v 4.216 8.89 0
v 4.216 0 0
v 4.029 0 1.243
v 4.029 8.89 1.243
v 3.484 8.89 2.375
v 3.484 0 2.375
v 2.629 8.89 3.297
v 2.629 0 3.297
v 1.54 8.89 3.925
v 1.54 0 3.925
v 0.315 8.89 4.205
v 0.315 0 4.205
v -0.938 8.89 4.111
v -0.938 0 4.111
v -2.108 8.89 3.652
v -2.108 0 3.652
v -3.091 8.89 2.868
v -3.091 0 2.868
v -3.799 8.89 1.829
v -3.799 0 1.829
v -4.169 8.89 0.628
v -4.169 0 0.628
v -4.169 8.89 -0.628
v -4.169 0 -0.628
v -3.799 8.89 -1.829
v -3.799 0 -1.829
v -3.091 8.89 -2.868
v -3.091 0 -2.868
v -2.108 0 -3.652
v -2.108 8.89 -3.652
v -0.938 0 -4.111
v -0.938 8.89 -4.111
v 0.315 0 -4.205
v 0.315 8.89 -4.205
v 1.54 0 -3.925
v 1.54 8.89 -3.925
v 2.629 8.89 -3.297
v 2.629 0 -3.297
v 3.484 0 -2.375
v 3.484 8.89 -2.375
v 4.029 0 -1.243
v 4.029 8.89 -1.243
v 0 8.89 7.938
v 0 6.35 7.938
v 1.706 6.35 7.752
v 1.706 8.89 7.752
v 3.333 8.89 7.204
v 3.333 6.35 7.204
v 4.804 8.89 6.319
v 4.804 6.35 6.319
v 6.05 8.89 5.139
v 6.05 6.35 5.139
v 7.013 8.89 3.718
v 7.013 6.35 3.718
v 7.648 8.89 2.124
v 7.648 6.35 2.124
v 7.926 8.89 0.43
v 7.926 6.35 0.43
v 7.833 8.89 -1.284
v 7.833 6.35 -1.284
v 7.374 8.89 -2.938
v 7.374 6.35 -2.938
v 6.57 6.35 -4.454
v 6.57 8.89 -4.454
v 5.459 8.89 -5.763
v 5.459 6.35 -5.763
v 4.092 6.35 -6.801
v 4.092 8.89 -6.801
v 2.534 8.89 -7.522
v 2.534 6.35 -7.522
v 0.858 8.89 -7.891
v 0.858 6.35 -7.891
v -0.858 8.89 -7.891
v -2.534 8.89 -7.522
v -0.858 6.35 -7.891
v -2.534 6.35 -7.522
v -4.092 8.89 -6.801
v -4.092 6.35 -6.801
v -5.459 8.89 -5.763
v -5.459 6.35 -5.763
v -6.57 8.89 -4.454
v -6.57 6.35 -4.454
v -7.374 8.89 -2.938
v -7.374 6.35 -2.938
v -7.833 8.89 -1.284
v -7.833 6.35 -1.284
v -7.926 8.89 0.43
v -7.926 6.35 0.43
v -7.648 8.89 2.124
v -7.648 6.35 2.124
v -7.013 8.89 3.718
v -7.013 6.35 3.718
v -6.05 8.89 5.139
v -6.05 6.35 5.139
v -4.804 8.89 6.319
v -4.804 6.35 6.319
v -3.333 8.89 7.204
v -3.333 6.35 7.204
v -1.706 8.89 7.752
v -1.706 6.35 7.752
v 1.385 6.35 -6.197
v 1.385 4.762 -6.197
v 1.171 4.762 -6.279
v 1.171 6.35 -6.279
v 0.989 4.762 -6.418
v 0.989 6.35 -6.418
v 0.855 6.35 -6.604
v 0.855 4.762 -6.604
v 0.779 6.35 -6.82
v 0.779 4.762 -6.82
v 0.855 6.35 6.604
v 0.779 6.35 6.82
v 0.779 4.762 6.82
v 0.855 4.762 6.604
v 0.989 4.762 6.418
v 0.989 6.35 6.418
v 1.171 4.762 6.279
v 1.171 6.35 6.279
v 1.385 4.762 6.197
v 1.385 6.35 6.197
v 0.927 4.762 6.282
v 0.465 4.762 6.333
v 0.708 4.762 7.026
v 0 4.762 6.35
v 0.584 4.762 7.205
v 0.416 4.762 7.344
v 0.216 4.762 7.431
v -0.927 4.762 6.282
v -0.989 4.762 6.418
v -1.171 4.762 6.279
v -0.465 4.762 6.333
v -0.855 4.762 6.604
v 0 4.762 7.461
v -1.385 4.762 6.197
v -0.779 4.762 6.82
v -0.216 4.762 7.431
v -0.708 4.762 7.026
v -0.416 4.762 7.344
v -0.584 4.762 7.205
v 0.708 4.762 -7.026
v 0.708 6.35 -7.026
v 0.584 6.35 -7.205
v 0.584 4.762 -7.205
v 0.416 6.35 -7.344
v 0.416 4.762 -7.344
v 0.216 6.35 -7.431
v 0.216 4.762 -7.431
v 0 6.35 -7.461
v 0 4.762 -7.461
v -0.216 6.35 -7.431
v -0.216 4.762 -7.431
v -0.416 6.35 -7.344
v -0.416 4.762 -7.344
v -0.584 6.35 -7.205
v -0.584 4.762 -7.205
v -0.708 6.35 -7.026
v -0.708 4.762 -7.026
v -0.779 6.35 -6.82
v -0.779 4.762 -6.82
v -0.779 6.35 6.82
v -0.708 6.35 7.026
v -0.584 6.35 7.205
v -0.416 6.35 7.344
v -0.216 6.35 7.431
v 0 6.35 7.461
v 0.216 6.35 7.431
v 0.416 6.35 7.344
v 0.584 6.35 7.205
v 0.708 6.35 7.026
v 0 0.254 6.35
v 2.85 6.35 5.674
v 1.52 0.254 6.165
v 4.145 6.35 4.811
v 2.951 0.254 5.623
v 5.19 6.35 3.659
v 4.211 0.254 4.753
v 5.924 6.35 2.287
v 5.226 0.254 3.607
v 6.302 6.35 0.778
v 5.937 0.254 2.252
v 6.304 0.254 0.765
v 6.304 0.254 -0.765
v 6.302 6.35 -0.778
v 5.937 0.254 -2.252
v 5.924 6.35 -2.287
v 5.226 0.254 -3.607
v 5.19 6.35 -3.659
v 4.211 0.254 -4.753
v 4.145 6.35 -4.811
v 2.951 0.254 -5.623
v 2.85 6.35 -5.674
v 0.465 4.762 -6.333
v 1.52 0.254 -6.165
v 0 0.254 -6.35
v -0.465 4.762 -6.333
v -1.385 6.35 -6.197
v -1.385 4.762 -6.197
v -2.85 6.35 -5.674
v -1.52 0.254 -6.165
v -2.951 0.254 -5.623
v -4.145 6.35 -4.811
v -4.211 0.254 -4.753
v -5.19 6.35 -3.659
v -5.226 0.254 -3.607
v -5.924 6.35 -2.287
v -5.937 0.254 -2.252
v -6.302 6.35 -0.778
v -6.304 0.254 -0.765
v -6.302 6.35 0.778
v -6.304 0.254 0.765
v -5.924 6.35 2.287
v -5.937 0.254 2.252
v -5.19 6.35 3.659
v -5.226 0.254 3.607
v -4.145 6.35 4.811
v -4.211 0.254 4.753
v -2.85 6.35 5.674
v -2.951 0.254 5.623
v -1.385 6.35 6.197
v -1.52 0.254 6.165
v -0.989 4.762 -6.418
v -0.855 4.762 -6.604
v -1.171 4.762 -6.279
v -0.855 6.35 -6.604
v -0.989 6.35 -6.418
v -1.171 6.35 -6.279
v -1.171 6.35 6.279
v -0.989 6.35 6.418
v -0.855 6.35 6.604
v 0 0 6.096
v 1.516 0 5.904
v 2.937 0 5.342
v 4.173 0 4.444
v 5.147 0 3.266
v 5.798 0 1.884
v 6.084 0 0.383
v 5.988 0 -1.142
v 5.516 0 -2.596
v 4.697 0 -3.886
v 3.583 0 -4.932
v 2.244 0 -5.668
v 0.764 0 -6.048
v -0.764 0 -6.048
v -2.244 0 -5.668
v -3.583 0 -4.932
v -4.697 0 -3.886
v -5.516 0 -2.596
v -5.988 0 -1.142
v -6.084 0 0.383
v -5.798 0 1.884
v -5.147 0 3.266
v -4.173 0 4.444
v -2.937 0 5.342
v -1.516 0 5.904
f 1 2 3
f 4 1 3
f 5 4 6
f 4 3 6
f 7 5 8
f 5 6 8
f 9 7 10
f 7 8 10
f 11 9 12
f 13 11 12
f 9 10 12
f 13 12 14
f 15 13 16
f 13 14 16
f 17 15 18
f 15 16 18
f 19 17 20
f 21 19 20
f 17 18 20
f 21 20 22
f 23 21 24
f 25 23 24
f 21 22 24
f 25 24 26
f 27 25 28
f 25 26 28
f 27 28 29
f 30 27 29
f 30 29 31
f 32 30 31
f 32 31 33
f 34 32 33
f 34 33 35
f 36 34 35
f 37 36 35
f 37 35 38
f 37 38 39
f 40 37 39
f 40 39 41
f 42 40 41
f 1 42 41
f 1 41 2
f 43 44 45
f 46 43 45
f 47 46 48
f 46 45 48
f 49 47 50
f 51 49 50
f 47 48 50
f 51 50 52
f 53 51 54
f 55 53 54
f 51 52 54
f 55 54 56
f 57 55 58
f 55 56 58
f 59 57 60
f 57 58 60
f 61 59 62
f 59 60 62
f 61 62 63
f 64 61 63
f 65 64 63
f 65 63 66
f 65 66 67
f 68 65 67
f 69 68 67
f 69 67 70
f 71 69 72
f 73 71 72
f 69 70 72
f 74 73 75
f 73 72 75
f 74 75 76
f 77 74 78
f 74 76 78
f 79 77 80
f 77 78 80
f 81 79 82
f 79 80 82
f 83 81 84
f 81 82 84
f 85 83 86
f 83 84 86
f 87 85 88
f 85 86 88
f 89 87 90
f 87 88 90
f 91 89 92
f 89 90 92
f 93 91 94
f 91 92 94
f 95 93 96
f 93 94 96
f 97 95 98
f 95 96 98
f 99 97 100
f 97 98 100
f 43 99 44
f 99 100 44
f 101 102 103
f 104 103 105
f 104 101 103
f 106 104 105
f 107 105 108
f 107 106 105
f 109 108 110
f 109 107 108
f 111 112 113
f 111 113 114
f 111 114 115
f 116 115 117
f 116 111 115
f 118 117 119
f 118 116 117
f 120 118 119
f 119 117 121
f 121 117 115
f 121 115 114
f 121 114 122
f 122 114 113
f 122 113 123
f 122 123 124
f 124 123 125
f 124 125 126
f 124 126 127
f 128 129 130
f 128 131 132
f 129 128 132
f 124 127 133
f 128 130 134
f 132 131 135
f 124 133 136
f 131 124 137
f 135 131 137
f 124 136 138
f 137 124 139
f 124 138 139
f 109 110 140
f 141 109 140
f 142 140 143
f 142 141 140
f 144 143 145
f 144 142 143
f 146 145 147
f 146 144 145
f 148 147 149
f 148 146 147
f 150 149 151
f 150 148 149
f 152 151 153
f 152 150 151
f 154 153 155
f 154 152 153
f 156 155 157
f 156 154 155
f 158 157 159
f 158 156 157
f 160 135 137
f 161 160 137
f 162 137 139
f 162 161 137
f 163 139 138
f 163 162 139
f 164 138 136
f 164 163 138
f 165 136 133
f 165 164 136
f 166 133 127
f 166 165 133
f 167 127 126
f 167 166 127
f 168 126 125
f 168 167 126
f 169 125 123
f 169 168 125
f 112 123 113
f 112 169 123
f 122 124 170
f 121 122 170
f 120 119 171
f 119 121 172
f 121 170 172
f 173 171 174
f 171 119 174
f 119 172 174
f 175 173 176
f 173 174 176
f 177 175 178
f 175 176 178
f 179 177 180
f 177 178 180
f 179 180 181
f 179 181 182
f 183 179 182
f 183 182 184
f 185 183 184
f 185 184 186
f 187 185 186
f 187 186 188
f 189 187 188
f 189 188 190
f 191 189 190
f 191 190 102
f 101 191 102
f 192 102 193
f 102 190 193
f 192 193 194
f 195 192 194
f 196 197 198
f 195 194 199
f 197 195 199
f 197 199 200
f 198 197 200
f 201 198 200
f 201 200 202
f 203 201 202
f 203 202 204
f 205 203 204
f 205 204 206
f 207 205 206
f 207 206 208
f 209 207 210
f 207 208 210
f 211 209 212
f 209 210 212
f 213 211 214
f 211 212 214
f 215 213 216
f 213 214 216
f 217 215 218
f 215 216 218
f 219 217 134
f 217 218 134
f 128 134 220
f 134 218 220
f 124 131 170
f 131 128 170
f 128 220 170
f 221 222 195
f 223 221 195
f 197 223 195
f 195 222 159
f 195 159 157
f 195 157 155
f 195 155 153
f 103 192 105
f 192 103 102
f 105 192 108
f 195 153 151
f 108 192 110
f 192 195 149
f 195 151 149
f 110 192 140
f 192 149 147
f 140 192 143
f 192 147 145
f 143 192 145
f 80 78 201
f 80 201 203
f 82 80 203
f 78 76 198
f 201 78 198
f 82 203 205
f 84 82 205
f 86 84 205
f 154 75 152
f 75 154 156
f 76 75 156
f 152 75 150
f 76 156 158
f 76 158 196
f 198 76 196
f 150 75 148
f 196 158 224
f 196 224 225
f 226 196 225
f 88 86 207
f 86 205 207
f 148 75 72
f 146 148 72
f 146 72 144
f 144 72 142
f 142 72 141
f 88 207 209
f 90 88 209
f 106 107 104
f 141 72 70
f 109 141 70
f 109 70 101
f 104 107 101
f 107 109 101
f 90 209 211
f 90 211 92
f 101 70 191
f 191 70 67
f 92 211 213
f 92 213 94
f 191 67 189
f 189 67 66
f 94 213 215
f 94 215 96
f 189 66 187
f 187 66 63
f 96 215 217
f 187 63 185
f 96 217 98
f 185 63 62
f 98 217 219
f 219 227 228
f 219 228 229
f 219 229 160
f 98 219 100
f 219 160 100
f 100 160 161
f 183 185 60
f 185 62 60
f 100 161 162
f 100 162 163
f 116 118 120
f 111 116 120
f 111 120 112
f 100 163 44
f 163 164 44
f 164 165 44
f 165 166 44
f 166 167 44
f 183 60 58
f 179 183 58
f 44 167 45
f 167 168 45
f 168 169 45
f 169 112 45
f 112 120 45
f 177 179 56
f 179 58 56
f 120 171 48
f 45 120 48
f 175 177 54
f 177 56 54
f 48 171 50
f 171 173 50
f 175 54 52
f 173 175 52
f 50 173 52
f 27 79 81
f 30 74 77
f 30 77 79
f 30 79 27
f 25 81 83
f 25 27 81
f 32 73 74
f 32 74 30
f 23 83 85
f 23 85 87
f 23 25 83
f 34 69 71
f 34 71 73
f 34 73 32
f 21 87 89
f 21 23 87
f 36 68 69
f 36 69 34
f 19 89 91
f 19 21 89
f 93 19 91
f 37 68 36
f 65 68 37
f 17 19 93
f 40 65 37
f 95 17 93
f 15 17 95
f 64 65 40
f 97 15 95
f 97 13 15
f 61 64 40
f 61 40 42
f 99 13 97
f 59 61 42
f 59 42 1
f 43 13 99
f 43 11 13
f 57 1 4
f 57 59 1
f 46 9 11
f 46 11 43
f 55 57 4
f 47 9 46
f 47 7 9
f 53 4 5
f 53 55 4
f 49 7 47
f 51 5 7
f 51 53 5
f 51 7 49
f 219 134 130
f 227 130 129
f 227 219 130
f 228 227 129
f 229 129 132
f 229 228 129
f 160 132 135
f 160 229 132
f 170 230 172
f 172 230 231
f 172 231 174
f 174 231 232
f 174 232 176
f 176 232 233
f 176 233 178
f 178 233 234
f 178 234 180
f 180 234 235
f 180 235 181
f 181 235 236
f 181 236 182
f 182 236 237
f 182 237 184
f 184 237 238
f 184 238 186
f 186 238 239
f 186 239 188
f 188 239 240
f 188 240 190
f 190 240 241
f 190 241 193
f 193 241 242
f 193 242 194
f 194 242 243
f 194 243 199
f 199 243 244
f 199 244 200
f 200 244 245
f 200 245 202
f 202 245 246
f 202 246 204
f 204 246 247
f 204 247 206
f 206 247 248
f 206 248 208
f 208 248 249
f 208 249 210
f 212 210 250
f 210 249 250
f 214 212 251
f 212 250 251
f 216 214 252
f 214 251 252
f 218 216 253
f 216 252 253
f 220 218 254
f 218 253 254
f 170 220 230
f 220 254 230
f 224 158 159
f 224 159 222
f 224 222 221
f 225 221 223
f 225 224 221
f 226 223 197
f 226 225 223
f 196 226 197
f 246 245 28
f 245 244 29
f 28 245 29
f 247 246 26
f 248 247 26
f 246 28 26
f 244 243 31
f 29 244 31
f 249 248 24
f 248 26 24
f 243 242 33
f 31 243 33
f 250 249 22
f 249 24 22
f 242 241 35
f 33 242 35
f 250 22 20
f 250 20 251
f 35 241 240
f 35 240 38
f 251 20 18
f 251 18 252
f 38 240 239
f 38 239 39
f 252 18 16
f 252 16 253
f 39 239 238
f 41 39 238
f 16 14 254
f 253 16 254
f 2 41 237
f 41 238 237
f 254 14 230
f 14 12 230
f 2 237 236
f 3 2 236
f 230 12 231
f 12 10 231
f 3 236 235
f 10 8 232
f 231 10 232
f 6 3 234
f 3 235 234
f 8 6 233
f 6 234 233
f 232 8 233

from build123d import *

# Parameters (mm, degrees)
SKETCH2_R                   = 6.35
BOSS_EXTRUDE1_DEPTH         = 6.35
SKETCH3_R                   = 7.9375
BOSS_EXTRUDE2_DEPTH         = 2.54
BOSS_EXTRUDE3_DEPTH         = 1.5875
F_3_8_24_TAPPED_HOLE1_D     = 8.4328
F_3_8_24_TAPPED_HOLE1_DEPTH = 22.352
F_3_8_24_TAPPED_HOLE1_TIP   = 2.533468714
CHAMFER1_SIZE               = 0.254
FILLET1_R                   = 0.79375


with BuildPart() as part:
    # Sketch2 → Boss-Extrude1 (new body)
    with BuildSketch(Plane(origin=(0, 0, 0), x_dir=(1, 0, 0), z_dir=(0, 1, 0))):
        with Locations(Location((0, 0, 0), (0, 0, 270))):
            Circle(SKETCH2_R)
    extrude(amount=BOSS_EXTRUDE1_DEPTH)

    # Sketch3 → Boss-Extrude2 (add)
    with BuildSketch(Plane(origin=(0, 6.35, 0), x_dir=(1, 0, 0), z_dir=(0, 1, 0))):
        with Locations(Location((0, 0, 0), (0, 0, 270))):
            Circle(SKETCH3_R)
    extrude(amount=BOSS_EXTRUDE2_DEPTH)

    # Sketch8 → Boss-Extrude3 (add)
    with BuildSketch(Plane.XZ.offset(-6.35)):
        with BuildLine():
            Line((-0.79375, -6.6675), (-0.79375, 6.6675))
            ThreePointArc((-0.79375, 6.6675), (0, 7.46125), (0.79375, 6.6675))
            Line((0.79375, 6.6675), (0.79375, -6.6675))
            ThreePointArc((0.79375, -6.6675), (0, -7.46125), (-0.79375, -6.6675))
        make_face()
    extrude(amount=BOSS_EXTRUDE3_DEPTH)

    # 3/8-24 Tapped Hole1
    with Locations(Plane(origin=(0, 8.89, 0), x_dir=(-1, 0, 0), z_dir=(0, 1, 0))):
        with Locations((0, 0)):
            Hole(F_3_8_24_TAPPED_HOLE1_D / 2, depth=F_3_8_24_TAPPED_HOLE1_DEPTH)
            with Locations((0, 0, -(F_3_8_24_TAPPED_HOLE1_DEPTH + F_3_8_24_TAPPED_HOLE1_TIP / 2))):  # 118° drill point
                Cone(0, F_3_8_24_TAPPED_HOLE1_D / 2, F_3_8_24_TAPPED_HOLE1_TIP, mode=Mode.SUBTRACT)

    # Chamfer1
    chamfer1_edges = [part.edges().sort_by_distance(p)[0] for p in [
        (0, 0, -6.35),
    ]]
    chamfer(chamfer1_edges, length=CHAMFER1_SIZE)

    # Fillet1
    # the kernel refuses this fillet: 0.79375 mm, written as the material it adds along each edge
    with BuildSketch(Plane(origin=(0.79375, 7.850289674, 6.300195309), x_dir=(0.985141793538893, 0, -0.17174296673509887), z_dir=(0, -1, 0)), Plane(origin=(-0.79375, 7.850289674, -6.300195309), x_dir=(-0.985141793538893, 0, 0.17174296673509887), z_dir=(0, -1, 0))) as fillet1_piece_1:
        with BuildLine():
            CenterArc((0.637623112, 0.792863336), FILLET1_R, 200.939239267, 66.352342207)
            Line((-0.103707592, 0.509194779), (-0.177840663, 0.480827923))
            ThreePointArc((-0.177840663, 0.480827923), (-0.141277627, 0.348215104), (-0.07819563, -0.013632098))
            Line((-0.07819563, -0.013632098), (0.003750724, -0.079286334))
            ThreePointArc((0.003750724, -0.079286334), (0.300057935, -0.072281687), (0.596365145, -0.079286334))
            Line((0.596365145, -0.079286334), (0.60011587, 0))
        make_face()
    extrude(amount=3.087789674)
    with BuildSketch(Plane(origin=(0.79375, 7.850289674, -6.300195309), x_dir=(0.985141793538893, 0, 0.17174296673509887), z_dir=(0, -1, 0)), Plane(origin=(-0.79375, 7.850289674, 6.300195309), x_dir=(-0.985141793538893, 0, -0.17174296673509887), z_dir=(0, -1, 0))) as fillet1_piece_2:
        with BuildLine():
            CenterArc((0.637623112, -0.792863336), FILLET1_R, 92.708418526, 66.352342207)
            Line((-0.103707592, -0.509194779), (-0.177840663, -0.480827923))
            ThreePointArc((-0.177840663, -0.480827923), (-0.141277627, -0.348215104), (-0.07819563, 0.013632098))
            Line((-0.07819563, 0.013632098), (0.003750724, 0.079286334))
            ThreePointArc((0.003750724, 0.079286334), (0.300057935, 0.072281687), (0.596365145, 0.079286334))
            Line((0.596365145, 0.079286334), (0.60011587, 0))
        make_face()
    extrude(amount=3.087789674)


solid = part.part
